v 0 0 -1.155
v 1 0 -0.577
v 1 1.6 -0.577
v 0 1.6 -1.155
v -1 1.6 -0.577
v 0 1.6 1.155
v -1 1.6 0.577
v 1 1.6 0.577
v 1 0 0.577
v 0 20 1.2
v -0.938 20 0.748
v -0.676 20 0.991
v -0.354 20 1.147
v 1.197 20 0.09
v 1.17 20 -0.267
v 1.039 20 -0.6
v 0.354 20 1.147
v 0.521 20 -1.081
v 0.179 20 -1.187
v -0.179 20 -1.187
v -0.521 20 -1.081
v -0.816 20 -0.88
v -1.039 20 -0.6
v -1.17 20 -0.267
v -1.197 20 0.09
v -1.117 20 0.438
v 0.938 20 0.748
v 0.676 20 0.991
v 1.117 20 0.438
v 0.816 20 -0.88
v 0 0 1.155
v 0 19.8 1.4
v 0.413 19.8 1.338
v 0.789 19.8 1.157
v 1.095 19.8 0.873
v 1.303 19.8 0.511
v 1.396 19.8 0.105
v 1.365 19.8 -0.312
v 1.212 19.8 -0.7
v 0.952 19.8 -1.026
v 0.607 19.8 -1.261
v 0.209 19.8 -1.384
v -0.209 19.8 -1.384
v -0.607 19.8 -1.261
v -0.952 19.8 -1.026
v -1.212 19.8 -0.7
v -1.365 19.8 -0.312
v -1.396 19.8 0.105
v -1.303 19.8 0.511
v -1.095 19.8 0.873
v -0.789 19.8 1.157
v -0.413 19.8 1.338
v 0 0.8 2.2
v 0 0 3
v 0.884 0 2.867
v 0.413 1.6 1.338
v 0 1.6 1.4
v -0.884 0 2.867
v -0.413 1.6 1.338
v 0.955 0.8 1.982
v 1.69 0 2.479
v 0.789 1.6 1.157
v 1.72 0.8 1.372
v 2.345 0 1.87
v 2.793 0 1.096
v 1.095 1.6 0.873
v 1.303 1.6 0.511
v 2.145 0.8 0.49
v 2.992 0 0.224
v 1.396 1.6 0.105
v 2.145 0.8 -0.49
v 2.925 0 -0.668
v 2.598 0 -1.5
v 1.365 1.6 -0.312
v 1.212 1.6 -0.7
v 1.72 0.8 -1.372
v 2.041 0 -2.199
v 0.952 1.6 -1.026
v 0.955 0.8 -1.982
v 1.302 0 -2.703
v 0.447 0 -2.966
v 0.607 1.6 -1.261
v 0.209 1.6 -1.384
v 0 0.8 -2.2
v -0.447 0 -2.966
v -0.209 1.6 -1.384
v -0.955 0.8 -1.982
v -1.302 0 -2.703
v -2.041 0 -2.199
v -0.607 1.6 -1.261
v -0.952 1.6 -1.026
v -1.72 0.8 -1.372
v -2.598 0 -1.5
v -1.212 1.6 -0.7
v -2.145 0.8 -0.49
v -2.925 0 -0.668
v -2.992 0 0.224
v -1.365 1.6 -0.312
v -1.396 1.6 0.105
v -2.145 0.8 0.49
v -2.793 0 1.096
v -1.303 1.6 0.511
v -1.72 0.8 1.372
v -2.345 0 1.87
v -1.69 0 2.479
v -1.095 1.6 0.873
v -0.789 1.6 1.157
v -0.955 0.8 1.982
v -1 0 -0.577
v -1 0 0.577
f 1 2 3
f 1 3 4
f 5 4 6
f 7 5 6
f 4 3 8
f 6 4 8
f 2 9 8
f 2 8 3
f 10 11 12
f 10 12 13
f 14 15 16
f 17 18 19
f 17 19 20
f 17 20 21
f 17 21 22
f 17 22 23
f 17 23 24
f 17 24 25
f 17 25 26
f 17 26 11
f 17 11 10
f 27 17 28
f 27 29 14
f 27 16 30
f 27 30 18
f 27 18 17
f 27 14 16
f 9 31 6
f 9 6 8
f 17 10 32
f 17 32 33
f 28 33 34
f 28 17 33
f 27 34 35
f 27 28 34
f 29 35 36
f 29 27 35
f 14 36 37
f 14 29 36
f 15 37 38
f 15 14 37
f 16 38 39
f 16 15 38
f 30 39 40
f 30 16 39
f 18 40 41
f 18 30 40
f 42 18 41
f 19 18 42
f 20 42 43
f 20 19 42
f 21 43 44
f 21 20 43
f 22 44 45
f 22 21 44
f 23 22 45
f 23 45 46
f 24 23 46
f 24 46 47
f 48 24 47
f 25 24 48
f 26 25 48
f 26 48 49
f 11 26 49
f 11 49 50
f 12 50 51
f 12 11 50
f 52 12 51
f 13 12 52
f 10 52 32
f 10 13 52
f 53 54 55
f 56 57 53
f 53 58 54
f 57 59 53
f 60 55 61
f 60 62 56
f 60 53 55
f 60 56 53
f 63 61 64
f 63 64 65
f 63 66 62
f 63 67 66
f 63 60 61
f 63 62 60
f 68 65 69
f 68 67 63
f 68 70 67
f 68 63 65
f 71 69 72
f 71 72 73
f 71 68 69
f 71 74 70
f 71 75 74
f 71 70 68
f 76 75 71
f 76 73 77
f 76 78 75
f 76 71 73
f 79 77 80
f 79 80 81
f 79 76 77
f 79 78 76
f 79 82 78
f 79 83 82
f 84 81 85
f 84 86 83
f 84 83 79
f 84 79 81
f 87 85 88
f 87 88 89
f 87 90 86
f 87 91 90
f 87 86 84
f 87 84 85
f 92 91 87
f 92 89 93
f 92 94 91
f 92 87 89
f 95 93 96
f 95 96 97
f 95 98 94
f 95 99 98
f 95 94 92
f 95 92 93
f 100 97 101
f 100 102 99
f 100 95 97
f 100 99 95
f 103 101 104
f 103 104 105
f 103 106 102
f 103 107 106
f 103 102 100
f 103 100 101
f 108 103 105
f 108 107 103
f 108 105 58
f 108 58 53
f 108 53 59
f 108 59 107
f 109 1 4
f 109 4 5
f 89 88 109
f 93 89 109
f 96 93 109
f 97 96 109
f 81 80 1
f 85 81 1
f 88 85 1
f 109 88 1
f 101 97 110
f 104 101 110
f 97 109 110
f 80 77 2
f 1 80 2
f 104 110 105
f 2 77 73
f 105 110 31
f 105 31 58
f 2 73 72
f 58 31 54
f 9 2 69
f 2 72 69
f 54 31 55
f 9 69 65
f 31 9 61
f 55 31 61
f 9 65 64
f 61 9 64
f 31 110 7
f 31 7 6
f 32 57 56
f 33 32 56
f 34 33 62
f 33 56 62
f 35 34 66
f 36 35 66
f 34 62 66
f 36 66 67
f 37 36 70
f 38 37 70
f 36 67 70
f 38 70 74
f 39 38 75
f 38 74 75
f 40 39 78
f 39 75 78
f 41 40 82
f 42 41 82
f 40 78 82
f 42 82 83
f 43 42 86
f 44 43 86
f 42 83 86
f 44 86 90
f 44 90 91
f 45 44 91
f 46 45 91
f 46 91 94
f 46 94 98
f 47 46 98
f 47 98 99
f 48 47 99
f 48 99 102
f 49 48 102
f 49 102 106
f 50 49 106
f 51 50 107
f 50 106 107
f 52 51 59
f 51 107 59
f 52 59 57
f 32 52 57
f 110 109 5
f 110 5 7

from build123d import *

# Parameters (mm, degrees)
SKETCH_1_R      = 3
EXTRUDE_1_DEPTH = 1.6
CHAMFER_1_SIZE  = 1.6
SKETCH_2_R      = 1.4
EXTRUDE_2_DEPTH = 18.4
CHAMFER_2_SIZE  = 0.2


with BuildPart() as part:
    # 草图1 → 凸台-拉伸1 (new body)
    with BuildSketch(Plane(origin=(0, 0, 0), x_dir=(1, 0, 0), z_dir=(0, 1, 0))):
        with Locations(Location((0, 0, 0), (0, 0, 270))):
            Circle(SKETCH_1_R)
        Polygon((0, -1.154700538), (1, -0.577350269), (1, 0.577350269), (0, 1.154700538), (-1, 0.577350269), (-1, -0.577350269), align=None, mode=Mode.SUBTRACT)
    extrude(amount=EXTRUDE_1_DEPTH)

    # 倒角1
    # the kernel refuses this chamfer: 1.6 mm, written as the material it takes off along each edge
    with BuildSketch(Plane(origin=(0, 1.6, 0), x_dir=(0, 0, 1), z_dir=(-1, 0, 0))) as chamfer_1_piece_1:
        Polygon((3, -CHAMFER_1_SIZE), (3 - CHAMFER_1_SIZE, 0), (3, 0), align=None)
    revolve(axis=Axis((0, 1.6, 0), (0, 1, 0)), mode=Mode.SUBTRACT)

    # 草图2 → 凸台-拉伸2 (add)
    with BuildSketch(Plane(origin=(0, 1.6, 0), x_dir=(1, 0, 0), z_dir=(0, 1, 0))):
        with Locations(Location((0, 0, 0), (0, 0, 270))):
            Circle(SKETCH_2_R)
    extrude(amount=EXTRUDE_2_DEPTH)

    # 倒角2
    chamfer_2_edges = [part.edges().sort_by_distance(p)[0] for p in [
        (0, 20, -1.4),
    ]]
    chamfer(chamfer_2_edges, length=CHAMFER_2_SIZE)


solid = part.part
